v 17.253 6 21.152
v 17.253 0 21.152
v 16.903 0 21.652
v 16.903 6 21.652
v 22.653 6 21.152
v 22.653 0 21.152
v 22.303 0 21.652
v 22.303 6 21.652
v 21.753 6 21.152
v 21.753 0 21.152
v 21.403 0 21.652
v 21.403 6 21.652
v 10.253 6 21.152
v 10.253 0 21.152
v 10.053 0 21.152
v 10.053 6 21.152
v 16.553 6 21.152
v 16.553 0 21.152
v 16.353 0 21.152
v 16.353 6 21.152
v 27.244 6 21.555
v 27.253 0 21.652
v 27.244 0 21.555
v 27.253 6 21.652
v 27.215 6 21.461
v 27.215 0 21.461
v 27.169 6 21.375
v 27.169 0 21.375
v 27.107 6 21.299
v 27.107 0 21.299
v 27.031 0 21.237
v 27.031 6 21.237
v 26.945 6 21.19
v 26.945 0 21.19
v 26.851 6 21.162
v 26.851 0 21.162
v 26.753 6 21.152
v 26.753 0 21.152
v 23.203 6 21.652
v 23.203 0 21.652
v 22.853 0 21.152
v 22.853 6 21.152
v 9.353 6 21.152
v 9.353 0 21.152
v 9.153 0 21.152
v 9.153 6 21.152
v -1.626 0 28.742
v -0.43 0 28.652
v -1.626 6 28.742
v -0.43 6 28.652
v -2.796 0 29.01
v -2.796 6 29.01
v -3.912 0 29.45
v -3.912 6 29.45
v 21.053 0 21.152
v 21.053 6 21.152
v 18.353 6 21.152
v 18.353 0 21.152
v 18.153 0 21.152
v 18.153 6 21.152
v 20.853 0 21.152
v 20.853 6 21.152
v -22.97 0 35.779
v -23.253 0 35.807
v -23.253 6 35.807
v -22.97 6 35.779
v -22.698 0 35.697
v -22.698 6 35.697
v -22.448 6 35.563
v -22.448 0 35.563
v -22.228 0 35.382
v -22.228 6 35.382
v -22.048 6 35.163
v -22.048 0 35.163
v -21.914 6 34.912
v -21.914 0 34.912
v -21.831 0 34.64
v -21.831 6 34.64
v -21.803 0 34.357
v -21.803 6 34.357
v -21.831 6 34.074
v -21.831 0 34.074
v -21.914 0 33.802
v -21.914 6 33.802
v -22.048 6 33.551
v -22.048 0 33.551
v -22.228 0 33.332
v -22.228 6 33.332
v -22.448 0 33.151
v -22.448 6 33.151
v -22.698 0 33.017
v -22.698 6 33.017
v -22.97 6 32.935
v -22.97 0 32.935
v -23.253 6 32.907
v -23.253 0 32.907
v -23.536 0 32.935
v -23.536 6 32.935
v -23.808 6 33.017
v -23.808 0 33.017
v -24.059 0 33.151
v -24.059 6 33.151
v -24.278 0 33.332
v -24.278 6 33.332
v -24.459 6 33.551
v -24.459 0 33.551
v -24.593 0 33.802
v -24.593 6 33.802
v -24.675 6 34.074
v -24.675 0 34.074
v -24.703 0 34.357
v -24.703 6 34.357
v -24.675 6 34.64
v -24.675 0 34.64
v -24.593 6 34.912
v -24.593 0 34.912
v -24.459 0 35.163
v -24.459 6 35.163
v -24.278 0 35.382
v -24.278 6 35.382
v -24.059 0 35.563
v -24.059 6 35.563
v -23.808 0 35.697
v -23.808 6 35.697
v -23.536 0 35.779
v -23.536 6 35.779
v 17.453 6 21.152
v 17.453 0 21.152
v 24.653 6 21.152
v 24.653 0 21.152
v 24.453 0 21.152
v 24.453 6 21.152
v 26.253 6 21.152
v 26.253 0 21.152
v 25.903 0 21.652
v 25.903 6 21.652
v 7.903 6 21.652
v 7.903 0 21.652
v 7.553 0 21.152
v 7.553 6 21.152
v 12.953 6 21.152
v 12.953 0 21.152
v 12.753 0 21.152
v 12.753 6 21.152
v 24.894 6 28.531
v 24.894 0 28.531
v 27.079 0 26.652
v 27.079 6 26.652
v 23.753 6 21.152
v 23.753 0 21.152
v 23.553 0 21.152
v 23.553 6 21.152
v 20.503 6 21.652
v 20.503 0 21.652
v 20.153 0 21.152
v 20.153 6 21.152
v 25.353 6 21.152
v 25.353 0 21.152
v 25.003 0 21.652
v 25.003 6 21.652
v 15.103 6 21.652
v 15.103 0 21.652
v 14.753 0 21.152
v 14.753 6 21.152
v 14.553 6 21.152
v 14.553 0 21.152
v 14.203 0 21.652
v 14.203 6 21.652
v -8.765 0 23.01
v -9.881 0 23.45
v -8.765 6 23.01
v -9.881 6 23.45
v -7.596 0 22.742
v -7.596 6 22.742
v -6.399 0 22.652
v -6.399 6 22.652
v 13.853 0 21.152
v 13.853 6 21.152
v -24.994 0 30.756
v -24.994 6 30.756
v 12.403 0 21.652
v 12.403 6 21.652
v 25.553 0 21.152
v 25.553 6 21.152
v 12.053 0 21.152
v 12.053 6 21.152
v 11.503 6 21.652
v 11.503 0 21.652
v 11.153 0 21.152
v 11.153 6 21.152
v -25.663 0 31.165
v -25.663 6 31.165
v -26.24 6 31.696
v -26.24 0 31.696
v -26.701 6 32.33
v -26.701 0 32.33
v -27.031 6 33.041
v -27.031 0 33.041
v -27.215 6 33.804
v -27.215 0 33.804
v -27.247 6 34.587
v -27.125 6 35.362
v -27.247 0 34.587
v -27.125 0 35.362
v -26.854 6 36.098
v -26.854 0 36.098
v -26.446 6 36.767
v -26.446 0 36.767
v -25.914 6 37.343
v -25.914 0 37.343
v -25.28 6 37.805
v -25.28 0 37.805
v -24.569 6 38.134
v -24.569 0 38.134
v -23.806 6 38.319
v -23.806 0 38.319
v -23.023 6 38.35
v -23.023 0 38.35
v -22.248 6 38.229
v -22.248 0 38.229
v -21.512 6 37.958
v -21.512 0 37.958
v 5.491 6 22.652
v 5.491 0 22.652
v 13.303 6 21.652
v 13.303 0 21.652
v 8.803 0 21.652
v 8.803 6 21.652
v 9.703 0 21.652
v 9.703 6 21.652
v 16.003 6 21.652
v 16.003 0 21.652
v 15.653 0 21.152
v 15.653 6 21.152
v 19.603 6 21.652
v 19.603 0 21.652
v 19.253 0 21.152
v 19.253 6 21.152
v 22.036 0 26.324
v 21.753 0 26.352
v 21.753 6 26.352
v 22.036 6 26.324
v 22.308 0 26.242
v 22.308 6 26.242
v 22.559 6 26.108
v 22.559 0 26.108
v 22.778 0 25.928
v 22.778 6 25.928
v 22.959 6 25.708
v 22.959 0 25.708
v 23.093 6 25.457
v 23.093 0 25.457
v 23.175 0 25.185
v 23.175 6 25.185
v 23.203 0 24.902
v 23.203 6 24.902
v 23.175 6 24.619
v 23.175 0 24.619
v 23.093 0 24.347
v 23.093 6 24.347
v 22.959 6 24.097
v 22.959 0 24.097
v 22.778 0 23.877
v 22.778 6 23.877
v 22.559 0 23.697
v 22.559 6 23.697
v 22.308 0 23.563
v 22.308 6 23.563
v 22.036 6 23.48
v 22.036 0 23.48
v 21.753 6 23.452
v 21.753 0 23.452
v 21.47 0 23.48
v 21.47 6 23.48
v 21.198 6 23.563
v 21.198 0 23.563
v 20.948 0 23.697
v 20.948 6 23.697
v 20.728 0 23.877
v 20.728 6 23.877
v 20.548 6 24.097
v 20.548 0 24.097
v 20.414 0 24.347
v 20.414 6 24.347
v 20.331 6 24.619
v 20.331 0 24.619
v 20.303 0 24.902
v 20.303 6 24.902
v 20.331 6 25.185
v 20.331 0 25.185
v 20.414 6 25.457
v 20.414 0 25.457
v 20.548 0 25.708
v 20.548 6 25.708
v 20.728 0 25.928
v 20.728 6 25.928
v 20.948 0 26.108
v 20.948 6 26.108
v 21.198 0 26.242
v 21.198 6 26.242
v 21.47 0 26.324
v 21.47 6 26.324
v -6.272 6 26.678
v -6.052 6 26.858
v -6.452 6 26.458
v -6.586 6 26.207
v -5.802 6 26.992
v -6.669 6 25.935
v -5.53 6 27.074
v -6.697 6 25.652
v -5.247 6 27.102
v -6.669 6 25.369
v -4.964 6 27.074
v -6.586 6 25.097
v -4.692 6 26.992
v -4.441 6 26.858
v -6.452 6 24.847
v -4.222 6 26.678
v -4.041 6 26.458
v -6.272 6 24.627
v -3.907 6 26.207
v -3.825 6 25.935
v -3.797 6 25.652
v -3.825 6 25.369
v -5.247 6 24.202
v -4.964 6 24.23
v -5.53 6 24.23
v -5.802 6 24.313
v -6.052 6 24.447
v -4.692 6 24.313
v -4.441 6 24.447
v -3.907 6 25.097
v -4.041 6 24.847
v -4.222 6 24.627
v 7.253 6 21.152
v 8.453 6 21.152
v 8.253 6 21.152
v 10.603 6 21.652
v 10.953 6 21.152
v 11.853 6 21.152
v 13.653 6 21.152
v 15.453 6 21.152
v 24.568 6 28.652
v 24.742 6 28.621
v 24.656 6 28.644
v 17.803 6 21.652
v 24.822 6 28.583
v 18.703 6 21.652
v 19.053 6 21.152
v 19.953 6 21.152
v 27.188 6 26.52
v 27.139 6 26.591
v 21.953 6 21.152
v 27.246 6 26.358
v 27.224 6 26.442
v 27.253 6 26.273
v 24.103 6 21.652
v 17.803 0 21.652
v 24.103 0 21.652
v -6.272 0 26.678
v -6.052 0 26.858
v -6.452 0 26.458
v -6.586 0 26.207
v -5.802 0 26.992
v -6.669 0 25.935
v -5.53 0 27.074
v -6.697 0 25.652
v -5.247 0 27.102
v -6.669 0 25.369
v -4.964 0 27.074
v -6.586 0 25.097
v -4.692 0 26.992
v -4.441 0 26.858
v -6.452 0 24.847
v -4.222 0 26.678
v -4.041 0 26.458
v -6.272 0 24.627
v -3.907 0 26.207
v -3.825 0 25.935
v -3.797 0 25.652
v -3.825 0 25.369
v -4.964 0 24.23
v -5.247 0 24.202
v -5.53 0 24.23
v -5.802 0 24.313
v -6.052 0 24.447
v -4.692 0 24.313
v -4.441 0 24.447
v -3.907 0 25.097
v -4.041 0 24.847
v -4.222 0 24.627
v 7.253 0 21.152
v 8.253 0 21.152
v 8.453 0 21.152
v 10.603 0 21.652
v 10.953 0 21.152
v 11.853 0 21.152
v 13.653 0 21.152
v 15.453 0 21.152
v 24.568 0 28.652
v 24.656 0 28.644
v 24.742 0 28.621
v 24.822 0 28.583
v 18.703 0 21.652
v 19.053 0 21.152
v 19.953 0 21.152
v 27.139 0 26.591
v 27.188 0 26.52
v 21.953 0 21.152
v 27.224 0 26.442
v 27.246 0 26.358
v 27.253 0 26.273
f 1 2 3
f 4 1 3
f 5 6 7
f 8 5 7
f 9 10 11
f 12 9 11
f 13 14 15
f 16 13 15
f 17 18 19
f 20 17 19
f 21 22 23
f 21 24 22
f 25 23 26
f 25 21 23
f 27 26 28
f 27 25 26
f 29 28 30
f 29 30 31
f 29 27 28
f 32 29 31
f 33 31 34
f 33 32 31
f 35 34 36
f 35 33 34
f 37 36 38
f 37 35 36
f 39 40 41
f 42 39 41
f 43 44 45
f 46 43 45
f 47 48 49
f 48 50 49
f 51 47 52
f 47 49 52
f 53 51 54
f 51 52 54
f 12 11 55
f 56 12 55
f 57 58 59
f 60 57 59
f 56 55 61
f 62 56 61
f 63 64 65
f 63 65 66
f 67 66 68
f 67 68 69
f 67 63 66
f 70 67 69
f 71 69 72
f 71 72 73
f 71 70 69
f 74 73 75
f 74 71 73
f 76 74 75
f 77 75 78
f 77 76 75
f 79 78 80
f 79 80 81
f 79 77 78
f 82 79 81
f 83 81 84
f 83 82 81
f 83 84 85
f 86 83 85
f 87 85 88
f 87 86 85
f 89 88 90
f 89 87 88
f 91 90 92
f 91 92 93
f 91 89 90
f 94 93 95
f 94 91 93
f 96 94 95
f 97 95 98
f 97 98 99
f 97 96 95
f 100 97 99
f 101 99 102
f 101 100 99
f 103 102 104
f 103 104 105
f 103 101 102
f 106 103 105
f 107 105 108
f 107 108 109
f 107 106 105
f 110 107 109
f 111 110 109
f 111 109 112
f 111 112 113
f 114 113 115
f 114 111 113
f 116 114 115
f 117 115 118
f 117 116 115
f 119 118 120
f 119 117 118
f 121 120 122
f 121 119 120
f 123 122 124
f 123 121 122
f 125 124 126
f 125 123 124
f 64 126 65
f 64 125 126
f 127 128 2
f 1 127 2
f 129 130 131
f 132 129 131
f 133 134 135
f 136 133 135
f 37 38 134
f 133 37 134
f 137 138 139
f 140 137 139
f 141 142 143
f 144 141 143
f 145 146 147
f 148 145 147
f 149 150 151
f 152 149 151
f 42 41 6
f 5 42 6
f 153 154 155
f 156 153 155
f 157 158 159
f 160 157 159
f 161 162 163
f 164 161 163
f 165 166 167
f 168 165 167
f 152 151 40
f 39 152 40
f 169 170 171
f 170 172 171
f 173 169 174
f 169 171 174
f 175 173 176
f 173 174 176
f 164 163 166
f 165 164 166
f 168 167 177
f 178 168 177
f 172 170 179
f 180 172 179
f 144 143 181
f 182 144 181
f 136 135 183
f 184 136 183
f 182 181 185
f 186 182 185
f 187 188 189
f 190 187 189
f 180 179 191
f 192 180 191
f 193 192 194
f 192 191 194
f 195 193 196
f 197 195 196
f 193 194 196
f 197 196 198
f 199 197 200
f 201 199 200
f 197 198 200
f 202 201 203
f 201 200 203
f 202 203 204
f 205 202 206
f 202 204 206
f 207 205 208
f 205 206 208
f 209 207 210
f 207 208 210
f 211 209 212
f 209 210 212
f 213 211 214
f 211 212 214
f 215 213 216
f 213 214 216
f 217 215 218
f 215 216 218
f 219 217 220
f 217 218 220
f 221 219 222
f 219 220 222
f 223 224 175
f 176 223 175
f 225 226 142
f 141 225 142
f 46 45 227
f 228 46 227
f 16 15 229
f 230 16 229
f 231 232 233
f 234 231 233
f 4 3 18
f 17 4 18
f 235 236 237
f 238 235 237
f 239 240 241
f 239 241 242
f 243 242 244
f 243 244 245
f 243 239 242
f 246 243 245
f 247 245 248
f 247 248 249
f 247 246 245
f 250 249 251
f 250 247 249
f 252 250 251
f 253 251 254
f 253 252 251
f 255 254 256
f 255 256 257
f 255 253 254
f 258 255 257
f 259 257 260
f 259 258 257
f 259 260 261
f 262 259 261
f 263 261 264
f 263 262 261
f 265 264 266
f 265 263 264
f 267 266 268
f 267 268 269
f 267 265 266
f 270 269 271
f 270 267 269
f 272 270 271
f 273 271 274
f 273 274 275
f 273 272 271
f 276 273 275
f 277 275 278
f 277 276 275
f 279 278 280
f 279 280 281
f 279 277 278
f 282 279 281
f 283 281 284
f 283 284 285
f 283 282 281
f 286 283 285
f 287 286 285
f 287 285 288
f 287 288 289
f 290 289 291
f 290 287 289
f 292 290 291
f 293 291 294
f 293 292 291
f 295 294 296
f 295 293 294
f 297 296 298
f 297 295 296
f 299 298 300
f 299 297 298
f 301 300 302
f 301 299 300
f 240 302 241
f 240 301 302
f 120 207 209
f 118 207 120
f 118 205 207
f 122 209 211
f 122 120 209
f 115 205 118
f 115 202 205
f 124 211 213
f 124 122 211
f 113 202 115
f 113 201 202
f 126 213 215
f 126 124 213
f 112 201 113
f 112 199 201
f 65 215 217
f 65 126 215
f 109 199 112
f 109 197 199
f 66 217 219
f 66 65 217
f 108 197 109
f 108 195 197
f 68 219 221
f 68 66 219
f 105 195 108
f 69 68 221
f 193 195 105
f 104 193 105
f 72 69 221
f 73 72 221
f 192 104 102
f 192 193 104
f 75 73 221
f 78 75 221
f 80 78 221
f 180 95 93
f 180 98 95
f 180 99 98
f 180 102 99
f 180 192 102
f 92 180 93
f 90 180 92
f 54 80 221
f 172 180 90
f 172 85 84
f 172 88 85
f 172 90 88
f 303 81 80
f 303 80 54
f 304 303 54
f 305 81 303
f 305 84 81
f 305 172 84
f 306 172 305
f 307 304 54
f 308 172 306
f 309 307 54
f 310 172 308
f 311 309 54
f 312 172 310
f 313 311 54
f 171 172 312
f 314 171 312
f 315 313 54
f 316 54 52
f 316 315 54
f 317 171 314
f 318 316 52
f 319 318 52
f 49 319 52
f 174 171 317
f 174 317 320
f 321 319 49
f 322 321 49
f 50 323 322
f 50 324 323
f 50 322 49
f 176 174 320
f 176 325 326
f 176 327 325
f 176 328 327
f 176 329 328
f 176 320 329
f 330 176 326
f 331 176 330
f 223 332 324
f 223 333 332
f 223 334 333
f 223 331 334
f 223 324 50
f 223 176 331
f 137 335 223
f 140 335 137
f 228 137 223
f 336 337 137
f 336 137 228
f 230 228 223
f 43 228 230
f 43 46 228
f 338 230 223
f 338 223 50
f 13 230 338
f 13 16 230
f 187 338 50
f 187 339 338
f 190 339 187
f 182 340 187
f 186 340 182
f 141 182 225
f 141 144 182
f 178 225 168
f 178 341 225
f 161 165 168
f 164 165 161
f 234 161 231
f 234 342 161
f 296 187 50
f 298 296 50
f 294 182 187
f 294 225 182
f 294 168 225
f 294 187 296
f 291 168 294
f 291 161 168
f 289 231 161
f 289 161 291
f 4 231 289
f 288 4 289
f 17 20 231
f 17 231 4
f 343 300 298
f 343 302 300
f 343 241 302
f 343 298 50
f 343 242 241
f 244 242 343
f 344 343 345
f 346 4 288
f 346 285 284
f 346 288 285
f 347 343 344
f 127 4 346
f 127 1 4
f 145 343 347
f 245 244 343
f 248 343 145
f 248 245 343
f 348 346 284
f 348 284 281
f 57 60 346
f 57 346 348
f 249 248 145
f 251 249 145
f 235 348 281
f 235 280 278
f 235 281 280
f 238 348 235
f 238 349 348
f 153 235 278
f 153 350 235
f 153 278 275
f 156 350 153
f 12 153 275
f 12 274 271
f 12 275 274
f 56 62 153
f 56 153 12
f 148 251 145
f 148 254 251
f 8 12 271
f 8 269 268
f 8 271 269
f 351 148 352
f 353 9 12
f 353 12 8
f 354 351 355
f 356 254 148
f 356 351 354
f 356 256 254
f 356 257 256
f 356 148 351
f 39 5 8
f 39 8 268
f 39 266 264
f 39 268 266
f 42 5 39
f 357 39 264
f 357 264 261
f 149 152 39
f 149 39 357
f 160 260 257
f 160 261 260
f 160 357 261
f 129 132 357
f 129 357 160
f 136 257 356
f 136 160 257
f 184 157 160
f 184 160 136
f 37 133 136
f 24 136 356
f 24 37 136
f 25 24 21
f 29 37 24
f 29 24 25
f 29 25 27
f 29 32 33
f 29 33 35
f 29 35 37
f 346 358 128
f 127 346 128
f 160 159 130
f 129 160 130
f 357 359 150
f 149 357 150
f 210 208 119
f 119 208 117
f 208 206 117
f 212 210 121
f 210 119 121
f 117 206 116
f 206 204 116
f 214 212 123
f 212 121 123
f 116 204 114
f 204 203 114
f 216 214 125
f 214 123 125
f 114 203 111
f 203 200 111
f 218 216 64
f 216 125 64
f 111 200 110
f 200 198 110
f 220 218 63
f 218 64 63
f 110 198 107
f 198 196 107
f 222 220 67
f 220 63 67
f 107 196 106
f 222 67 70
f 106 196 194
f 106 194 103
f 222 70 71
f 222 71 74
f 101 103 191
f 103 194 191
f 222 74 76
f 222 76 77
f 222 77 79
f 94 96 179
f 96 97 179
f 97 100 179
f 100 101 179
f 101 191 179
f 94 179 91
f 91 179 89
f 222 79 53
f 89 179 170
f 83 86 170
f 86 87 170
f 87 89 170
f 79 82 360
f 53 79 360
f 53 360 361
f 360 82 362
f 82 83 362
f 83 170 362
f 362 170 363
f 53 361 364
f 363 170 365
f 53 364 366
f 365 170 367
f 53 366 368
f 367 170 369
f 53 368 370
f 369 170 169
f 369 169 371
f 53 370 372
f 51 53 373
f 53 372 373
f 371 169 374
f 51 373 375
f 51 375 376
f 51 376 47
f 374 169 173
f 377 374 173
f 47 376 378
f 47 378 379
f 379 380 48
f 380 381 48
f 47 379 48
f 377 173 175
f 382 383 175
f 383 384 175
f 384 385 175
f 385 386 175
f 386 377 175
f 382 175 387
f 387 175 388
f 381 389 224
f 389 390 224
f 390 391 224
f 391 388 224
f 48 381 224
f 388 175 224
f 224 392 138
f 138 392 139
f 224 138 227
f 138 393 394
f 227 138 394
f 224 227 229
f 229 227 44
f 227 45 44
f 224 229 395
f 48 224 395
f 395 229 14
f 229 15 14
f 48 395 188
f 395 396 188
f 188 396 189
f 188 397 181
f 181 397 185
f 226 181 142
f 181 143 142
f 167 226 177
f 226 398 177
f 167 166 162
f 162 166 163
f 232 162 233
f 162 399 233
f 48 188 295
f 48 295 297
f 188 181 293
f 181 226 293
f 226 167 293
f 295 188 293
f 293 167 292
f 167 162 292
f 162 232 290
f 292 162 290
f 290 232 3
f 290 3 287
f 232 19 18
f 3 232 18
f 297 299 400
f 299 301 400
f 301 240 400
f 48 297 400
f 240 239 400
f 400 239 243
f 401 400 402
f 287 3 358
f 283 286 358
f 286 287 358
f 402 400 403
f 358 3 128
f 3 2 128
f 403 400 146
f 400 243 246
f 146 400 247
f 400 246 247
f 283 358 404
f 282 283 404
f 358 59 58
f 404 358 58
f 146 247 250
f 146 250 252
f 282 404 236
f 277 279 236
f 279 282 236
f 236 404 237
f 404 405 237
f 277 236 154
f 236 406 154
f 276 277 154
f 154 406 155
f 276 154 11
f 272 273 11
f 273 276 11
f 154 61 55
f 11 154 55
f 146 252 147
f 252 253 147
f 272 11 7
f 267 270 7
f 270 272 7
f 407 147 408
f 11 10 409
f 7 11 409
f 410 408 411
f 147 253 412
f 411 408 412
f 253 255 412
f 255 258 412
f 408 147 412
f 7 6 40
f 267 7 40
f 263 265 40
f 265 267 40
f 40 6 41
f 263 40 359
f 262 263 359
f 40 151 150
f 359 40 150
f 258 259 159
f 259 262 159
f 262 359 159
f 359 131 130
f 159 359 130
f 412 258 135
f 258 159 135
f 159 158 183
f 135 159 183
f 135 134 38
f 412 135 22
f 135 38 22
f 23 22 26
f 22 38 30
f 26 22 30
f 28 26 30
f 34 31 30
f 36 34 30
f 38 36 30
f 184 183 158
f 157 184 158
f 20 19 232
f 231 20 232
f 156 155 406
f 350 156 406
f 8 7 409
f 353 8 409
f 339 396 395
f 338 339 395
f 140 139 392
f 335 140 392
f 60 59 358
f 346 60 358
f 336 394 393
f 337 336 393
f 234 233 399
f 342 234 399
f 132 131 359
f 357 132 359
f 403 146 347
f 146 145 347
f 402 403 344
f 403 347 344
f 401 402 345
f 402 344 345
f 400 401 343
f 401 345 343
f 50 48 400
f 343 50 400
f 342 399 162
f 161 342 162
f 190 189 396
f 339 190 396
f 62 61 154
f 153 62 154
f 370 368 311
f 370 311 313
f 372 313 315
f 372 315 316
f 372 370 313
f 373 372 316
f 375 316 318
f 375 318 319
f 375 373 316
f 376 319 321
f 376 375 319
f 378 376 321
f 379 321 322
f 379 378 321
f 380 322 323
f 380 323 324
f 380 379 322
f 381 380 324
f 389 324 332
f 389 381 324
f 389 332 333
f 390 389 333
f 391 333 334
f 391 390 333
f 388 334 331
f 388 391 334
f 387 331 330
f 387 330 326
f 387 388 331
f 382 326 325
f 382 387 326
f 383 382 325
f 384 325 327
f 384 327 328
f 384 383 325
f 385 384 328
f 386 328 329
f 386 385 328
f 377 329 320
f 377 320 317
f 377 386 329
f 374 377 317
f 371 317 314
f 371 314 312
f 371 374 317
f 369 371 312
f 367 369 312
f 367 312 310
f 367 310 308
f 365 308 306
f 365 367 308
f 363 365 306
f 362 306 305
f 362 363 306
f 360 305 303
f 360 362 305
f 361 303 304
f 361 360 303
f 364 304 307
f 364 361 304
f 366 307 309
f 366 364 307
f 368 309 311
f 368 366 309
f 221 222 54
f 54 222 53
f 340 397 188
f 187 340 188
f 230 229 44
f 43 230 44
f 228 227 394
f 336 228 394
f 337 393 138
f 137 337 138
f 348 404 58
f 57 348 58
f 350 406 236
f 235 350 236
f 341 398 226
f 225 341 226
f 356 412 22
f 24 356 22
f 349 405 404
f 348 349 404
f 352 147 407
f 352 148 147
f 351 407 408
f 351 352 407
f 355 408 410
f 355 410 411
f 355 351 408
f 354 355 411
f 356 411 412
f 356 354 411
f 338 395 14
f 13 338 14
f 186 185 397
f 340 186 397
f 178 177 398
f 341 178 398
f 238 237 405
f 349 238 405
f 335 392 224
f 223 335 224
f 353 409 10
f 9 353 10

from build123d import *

# Parameters (mm, degrees)
CROQUIS1_R              = 1.45
SALIENTE_EXTRUIR1_DEPTH = 6
REDONDEO1_R             = 0.5
REDONDEO2_R             = 8


with BuildPart() as part:
    # Croquis1 → Saliente-Extruir1 (new body)
    with BuildSketch(Plane(origin=(0, 0, 0), x_dir=(1, 0, 0), z_dir=(0, 1, 0))):
        with BuildLine():
            Line((-2.262086681, -28.652334501), (24.75319, -28.652334501))
            Line((24.75319, -28.652334501), (27.25319, -26.502334501))
            Line((27.25319, -26.502334501), (27.25319, -22.652334501))
            Line((27.25319, -22.652334501), (27.25319, -21.152334501))
            Line((27.25319, -21.152334501), (26.25319, -21.152334501))
            Line((26.25319, -21.152334501), (25.90319, -21.652334501))
            Line((25.90319, -21.652334501), (25.55319, -21.152334501))
            Line((25.55319, -21.152334501), (25.35319, -21.152334501))
            Line((25.35319, -21.152334501), (25.00319, -21.652334501))
            Line((25.00319, -21.652334501), (24.65319, -21.152334501))
            Line((24.65319, -21.152334501), (24.45319, -21.152334501))
            Line((24.45319, -21.152334501), (24.10319, -21.652334501))
            Line((24.10319, -21.652334501), (23.75319, -21.152334501))
            Line((23.75319, -21.152334501), (23.55319, -21.152334501))
            Line((23.55319, -21.152334501), (23.20319, -21.652334501))
            Line((23.20319, -21.652334501), (22.85319, -21.152334501))
            Line((22.85319, -21.152334501), (22.65319, -21.152334501))
            Line((22.65319, -21.152334501), (22.30319, -21.652334501))
            Line((22.30319, -21.652334501), (21.95319, -21.152334501))
            Line((21.95319, -21.152334501), (21.75319, -21.152334501))
            Line((21.75319, -21.152334501), (21.40319, -21.652334501))
            Line((21.40319, -21.652334501), (21.05319, -21.152334501))
            Line((21.05319, -21.152334501), (20.85319, -21.152334501))
            Line((20.85319, -21.152334501), (20.50319, -21.652334501))
            Line((20.50319, -21.652334501), (20.15319, -21.152334501))
            Line((20.15319, -21.152334501), (19.95319, -21.152334501))
            Line((19.95319, -21.152334501), (19.60319, -21.652334501))
            Line((19.60319, -21.652334501), (19.25319, -21.152334501))
            Line((19.25319, -21.152334501), (19.05319, -21.152334501))
            Line((19.05319, -21.152334501), (18.70319, -21.652334501))
            Line((18.70319, -21.652334501), (18.35319, -21.152334501))
            Line((18.35319, -21.152334501), (18.15319, -21.152334501))
            Line((18.15319, -21.152334501), (17.80319, -21.652334501))
            Line((17.80319, -21.652334501), (17.45319, -21.152334501))
            Line((17.45319, -21.152334501), (17.25319, -21.152334501))
            Line((17.25319, -21.152334501), (16.90319, -21.652334501))
            Line((16.90319, -21.652334501), (16.55319, -21.152334501))
            Line((16.55319, -21.152334501), (16.35319, -21.152334501))
            Line((16.35319, -21.152334501), (16.00319, -21.652334501))
            Line((16.00319, -21.652334501), (15.65319, -21.152334501))
            Line((15.65319, -21.152334501), (15.45319, -21.152334501))
            Line((15.45319, -21.152334501), (15.10319, -21.652334501))
            Line((15.10319, -21.652334501), (14.75319, -21.152334501))
            Line((14.75319, -21.152334501), (14.55319, -21.152334501))
            Line((14.55319, -21.152334501), (14.20319, -21.652334501))
            Line((14.20319, -21.652334501), (13.85319, -21.152334501))
            Line((13.85319, -21.152334501), (13.65319, -21.152334501))
            Line((13.65319, -21.152334501), (13.30319, -21.652334501))
            Line((13.30319, -21.652334501), (12.95319, -21.152334501))
            Line((12.95319, -21.152334501), (12.75319, -21.152334501))
            Line((12.75319, -21.152334501), (12.40319, -21.652334501))
            Line((12.40319, -21.652334501), (12.05319, -21.152334501))
            Line((12.05319, -21.152334501), (11.85319, -21.152334501))
            Line((11.85319, -21.152334501), (11.50319, -21.652334501))
            Line((11.50319, -21.652334501), (11.15319, -21.152334501))
            Line((11.15319, -21.152334501), (10.95319, -21.152334501))
            Line((10.95319, -21.152334501), (10.60319, -21.652334501))
            Line((10.60319, -21.652334501), (10.25319, -21.152334501))
            Line((10.25319, -21.152334501), (10.05319, -21.152334501))
            Line((10.05319, -21.152334501), (9.70319, -21.652334501))
            Line((9.70319, -21.652334501), (9.35319, -21.152334501))
            Line((9.35319, -21.152334501), (9.15319, -21.152334501))
            Line((9.15319, -21.152334501), (8.80319, -21.652334501))
            Line((8.80319, -21.652334501), (8.45319, -21.152334501))
            Line((8.45319, -21.152334501), (8.25319, -21.152334501))
            Line((8.25319, -21.152334501), (7.90319, -21.652334501))
            Line((7.90319, -21.652334501), (7.55319, -21.152334501))
            Line((7.55319, -21.152334501), (7.35319, -21.152334501))
            Line((7.35319, -21.152334501), (7.25319, -21.152334501))
            Line((7.25319, -21.152334501), (5.49119, -22.652334501))
            Line((5.49119, -22.652334501), (-5.24681, -22.652334501))
            Line((-5.24681, -22.652334501), (-8.231533319, -22.652334501))
            Line((-8.231533319, -22.652334501), (-24.994112506, -30.755671031))
            ThreePointArc((-24.994112506, -30.755671031), (-26.854466, -36.097869537), (-21.512267494, -37.958223031))
            Line((-21.512267494, -37.958223031), (-2.262086681, -28.652334501))
        make_face()
        with Locations((-23.25319, -34.356947031)):
            Circle(CROQUIS1_R, mode=Mode.SUBTRACT)
        with Locations((-5.24681, -25.652334501)):
            Circle(CROQUIS1_R, mode=Mode.SUBTRACT)
        with Locations((21.75319, -24.902334501)):
            Circle(CROQUIS1_R, mode=Mode.SUBTRACT)
    extrude(amount=SALIENTE_EXTRUIR1_DEPTH)

    # Redondeo1
    redondeo1_edges = [part.edges().sort_by_distance(p)[0] for p in [
        (24.75319, 3, 28.652334501),
        (27.25319, 3, 26.502334501),
        (27.25319, 3, 21.152334501),
    ]]
    fillet(redondeo1_edges, radius=REDONDEO1_R)

    # Redondeo2
    redondeo2_edges = [part.edges().sort_by_distance(p)[0] for p in [
        (-2.262086681, 3, 28.652334501),
        (-8.231533319, 3, 22.652334501),
    ]]
    fillet(redondeo2_edges, radius=REDONDEO2_R)


solid = part.part
